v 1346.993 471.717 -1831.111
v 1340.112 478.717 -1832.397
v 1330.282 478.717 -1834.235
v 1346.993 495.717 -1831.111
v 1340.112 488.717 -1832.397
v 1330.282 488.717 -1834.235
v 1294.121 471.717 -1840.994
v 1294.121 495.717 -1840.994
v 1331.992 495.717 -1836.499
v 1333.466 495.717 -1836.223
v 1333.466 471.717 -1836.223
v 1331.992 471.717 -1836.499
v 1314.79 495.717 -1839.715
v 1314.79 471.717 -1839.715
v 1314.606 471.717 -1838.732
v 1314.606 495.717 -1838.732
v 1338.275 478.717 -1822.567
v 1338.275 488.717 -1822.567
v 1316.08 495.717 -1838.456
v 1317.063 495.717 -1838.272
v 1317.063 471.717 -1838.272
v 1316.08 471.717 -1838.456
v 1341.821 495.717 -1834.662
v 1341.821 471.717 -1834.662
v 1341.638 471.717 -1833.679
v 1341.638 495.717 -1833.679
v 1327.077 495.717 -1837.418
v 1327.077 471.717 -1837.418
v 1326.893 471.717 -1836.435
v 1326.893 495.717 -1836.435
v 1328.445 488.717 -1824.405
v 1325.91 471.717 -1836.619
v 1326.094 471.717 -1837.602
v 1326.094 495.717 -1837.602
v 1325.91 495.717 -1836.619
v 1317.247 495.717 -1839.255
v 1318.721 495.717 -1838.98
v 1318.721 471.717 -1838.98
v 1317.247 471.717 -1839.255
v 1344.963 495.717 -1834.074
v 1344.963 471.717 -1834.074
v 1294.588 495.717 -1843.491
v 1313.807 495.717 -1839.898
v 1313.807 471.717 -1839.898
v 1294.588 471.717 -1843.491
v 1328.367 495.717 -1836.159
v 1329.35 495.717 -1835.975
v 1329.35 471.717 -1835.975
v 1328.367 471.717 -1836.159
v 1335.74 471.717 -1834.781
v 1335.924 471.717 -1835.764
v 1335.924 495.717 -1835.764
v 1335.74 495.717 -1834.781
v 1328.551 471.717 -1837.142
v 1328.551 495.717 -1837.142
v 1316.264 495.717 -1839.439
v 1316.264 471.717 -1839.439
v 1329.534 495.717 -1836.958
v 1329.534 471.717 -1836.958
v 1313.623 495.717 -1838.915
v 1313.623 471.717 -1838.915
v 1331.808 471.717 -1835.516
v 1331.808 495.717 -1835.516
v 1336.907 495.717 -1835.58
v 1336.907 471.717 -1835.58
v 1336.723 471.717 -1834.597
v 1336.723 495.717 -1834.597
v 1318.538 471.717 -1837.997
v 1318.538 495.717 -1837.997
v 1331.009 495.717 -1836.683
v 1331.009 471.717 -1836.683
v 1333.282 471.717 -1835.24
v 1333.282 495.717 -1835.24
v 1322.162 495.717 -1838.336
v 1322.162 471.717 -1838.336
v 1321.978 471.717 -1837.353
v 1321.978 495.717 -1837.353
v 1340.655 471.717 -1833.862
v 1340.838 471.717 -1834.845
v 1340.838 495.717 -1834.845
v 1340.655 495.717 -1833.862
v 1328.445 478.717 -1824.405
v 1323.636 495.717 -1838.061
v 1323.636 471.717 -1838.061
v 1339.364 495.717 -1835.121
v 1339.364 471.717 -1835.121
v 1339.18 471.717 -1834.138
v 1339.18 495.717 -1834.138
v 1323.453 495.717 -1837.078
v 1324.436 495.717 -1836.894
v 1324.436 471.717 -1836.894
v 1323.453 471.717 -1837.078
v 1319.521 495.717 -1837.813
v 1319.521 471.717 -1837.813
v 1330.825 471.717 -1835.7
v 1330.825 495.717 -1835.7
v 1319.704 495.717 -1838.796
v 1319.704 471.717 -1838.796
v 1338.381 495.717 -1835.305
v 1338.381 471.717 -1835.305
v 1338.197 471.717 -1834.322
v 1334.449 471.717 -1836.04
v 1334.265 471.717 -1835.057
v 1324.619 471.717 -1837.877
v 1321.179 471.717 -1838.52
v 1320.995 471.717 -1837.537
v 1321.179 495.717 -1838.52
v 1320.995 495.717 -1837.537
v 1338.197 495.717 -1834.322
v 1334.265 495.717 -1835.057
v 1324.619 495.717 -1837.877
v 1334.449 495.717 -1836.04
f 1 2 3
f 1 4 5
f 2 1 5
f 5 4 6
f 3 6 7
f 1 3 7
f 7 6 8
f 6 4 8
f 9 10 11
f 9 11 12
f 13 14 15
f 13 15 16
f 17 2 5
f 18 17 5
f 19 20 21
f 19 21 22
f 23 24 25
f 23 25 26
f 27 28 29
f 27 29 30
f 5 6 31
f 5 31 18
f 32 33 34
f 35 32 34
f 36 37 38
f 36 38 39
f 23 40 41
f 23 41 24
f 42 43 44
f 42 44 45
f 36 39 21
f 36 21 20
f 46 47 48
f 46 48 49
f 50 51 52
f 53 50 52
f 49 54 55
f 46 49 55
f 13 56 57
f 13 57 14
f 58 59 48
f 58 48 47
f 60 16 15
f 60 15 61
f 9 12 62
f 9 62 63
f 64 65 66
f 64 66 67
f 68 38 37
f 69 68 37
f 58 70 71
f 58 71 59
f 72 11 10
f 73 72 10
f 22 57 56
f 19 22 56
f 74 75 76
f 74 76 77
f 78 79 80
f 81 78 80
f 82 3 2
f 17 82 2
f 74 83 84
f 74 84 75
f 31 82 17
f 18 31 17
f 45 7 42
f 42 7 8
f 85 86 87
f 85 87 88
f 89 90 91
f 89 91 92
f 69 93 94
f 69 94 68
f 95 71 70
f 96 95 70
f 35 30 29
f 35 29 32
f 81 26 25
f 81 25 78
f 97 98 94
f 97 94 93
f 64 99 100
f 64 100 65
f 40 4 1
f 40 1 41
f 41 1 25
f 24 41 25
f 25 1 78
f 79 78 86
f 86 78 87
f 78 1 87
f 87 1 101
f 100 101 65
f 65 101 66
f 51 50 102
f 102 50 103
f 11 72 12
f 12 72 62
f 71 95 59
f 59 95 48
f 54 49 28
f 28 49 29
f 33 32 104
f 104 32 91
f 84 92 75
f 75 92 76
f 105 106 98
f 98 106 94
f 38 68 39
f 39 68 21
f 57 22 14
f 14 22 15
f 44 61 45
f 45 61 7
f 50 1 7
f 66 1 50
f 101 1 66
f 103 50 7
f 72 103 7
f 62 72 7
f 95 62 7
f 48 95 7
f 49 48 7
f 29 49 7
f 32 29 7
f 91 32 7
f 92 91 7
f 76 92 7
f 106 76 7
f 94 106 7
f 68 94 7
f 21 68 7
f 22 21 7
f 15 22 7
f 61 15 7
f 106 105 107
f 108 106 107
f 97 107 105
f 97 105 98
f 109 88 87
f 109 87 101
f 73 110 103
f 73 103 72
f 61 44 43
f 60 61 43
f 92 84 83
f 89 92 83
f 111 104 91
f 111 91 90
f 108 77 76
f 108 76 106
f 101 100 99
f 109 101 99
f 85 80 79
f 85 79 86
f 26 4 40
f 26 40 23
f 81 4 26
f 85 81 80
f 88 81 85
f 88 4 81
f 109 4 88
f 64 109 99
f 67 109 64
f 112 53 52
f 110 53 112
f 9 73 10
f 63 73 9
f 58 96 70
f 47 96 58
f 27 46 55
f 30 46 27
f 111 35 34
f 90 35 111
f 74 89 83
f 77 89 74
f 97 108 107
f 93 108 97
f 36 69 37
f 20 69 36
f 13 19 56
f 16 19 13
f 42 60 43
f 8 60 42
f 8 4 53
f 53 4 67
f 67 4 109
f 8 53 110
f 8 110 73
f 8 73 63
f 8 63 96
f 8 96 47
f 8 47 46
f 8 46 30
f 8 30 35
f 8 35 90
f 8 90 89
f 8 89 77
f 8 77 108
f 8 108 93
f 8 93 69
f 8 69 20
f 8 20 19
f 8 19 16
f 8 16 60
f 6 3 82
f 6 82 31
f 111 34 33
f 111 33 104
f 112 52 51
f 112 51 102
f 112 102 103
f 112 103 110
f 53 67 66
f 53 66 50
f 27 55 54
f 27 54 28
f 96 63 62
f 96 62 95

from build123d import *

# Parameters (mm, degrees)
SKETCH1_W           = 56.247710146
SKETCH1_H           = 24
BOSS_EXTRUDE1_DEPTH = 2.54
CHAMFER1_SIZE       = 5
SKETCH2_W           = 1
SKETCH2_H           = 24
CUT_EXTRUDE1_DEPTH  = 1
LPATTERN1_COUNT     = 12
LPATTERN1_PITCH     = 2.5
SKETCH3_W           = 10
SKETCH3_H           = 10
BOSS_EXTRUDE2_DEPTH = 10


with BuildPart() as part:
    # Sketch1 → Boss-Extrude1 (new body)
    with BuildSketch(Plane(origin=(376.193568869, 0, -2012.574360527), x_dir=(-0.9829750210853586, 0, -0.183739238929084), z_dir=(0.183739238929084, 0, -0.9829750210853586))):
        with Locations((-961.949517112, 483.716935274)):
            Rectangle(SKETCH1_W, SKETCH1_H)
    extrude(amount=BOSS_EXTRUDE1_DEPTH)

    # Chamfer1
    # the kernel refuses this chamfer: 5 mm, written as the material it takes off along each edge
    with BuildSketch(Plane(origin=(1349.877660436, 508.575350214, -1833.155789191), x_dir=(-0.15664201033904618, 0, 0.987655446295388), z_dir=(0, -1, 0))) as chamfer1_piece_1:
        Polygon((CHAMFER1_SIZE * 0.999621916911, CHAMFER1_SIZE * 0.0274958766106), (-CHAMFER1_SIZE * 0.0274958766106, CHAMFER1_SIZE * 0.999621916911), (0, 0), align=None)
    extrude(amount=49.71682988, mode=Mode.SUBTRACT)

    # Sketch2 → Cut-Extrude1 (cut)
    with BuildSketch(Plane(origin=(376.660266536, 0, -2015.07111708), x_dir=(-0.9829750210853584, 0, -0.18373923892908509), z_dir=(0.18373923892908506, 0, -0.9829750210853583))):
        with Locations((-981.377561484, 483.716935274)):
            Rectangle(SKETCH2_W, SKETCH2_H)
    cut_extrude1 = extrude(amount=-CUT_EXTRUDE1_DEPTH, mode=Mode.SUBTRACT)

    # LPattern1: Cut-Extrude1 ×12
    with Locations(*[Vector(-0.9829750210853567, 0, -0.18373923892909338) * (i * LPATTERN1_PITCH) for i in range(1, LPATTERN1_COUNT)]):
        add(cut_extrude1, mode=Mode.SUBTRACT)

    # Sketch3 → Boss-Extrude2 (add)
    with BuildSketch(Plane(origin=(376.193568869, 0, -2012.574360527), x_dir=(0.9829750210853584, 0, 0.18373923892908509), z_dir=(-0.18373923892908506, 0, 0.9829750210853583))):
        with Locations((975.613372185, 483.716935274)):
            Rectangle(SKETCH3_W, SKETCH3_H)
    extrude(amount=BOSS_EXTRUDE2_DEPTH)


solid = part.part
